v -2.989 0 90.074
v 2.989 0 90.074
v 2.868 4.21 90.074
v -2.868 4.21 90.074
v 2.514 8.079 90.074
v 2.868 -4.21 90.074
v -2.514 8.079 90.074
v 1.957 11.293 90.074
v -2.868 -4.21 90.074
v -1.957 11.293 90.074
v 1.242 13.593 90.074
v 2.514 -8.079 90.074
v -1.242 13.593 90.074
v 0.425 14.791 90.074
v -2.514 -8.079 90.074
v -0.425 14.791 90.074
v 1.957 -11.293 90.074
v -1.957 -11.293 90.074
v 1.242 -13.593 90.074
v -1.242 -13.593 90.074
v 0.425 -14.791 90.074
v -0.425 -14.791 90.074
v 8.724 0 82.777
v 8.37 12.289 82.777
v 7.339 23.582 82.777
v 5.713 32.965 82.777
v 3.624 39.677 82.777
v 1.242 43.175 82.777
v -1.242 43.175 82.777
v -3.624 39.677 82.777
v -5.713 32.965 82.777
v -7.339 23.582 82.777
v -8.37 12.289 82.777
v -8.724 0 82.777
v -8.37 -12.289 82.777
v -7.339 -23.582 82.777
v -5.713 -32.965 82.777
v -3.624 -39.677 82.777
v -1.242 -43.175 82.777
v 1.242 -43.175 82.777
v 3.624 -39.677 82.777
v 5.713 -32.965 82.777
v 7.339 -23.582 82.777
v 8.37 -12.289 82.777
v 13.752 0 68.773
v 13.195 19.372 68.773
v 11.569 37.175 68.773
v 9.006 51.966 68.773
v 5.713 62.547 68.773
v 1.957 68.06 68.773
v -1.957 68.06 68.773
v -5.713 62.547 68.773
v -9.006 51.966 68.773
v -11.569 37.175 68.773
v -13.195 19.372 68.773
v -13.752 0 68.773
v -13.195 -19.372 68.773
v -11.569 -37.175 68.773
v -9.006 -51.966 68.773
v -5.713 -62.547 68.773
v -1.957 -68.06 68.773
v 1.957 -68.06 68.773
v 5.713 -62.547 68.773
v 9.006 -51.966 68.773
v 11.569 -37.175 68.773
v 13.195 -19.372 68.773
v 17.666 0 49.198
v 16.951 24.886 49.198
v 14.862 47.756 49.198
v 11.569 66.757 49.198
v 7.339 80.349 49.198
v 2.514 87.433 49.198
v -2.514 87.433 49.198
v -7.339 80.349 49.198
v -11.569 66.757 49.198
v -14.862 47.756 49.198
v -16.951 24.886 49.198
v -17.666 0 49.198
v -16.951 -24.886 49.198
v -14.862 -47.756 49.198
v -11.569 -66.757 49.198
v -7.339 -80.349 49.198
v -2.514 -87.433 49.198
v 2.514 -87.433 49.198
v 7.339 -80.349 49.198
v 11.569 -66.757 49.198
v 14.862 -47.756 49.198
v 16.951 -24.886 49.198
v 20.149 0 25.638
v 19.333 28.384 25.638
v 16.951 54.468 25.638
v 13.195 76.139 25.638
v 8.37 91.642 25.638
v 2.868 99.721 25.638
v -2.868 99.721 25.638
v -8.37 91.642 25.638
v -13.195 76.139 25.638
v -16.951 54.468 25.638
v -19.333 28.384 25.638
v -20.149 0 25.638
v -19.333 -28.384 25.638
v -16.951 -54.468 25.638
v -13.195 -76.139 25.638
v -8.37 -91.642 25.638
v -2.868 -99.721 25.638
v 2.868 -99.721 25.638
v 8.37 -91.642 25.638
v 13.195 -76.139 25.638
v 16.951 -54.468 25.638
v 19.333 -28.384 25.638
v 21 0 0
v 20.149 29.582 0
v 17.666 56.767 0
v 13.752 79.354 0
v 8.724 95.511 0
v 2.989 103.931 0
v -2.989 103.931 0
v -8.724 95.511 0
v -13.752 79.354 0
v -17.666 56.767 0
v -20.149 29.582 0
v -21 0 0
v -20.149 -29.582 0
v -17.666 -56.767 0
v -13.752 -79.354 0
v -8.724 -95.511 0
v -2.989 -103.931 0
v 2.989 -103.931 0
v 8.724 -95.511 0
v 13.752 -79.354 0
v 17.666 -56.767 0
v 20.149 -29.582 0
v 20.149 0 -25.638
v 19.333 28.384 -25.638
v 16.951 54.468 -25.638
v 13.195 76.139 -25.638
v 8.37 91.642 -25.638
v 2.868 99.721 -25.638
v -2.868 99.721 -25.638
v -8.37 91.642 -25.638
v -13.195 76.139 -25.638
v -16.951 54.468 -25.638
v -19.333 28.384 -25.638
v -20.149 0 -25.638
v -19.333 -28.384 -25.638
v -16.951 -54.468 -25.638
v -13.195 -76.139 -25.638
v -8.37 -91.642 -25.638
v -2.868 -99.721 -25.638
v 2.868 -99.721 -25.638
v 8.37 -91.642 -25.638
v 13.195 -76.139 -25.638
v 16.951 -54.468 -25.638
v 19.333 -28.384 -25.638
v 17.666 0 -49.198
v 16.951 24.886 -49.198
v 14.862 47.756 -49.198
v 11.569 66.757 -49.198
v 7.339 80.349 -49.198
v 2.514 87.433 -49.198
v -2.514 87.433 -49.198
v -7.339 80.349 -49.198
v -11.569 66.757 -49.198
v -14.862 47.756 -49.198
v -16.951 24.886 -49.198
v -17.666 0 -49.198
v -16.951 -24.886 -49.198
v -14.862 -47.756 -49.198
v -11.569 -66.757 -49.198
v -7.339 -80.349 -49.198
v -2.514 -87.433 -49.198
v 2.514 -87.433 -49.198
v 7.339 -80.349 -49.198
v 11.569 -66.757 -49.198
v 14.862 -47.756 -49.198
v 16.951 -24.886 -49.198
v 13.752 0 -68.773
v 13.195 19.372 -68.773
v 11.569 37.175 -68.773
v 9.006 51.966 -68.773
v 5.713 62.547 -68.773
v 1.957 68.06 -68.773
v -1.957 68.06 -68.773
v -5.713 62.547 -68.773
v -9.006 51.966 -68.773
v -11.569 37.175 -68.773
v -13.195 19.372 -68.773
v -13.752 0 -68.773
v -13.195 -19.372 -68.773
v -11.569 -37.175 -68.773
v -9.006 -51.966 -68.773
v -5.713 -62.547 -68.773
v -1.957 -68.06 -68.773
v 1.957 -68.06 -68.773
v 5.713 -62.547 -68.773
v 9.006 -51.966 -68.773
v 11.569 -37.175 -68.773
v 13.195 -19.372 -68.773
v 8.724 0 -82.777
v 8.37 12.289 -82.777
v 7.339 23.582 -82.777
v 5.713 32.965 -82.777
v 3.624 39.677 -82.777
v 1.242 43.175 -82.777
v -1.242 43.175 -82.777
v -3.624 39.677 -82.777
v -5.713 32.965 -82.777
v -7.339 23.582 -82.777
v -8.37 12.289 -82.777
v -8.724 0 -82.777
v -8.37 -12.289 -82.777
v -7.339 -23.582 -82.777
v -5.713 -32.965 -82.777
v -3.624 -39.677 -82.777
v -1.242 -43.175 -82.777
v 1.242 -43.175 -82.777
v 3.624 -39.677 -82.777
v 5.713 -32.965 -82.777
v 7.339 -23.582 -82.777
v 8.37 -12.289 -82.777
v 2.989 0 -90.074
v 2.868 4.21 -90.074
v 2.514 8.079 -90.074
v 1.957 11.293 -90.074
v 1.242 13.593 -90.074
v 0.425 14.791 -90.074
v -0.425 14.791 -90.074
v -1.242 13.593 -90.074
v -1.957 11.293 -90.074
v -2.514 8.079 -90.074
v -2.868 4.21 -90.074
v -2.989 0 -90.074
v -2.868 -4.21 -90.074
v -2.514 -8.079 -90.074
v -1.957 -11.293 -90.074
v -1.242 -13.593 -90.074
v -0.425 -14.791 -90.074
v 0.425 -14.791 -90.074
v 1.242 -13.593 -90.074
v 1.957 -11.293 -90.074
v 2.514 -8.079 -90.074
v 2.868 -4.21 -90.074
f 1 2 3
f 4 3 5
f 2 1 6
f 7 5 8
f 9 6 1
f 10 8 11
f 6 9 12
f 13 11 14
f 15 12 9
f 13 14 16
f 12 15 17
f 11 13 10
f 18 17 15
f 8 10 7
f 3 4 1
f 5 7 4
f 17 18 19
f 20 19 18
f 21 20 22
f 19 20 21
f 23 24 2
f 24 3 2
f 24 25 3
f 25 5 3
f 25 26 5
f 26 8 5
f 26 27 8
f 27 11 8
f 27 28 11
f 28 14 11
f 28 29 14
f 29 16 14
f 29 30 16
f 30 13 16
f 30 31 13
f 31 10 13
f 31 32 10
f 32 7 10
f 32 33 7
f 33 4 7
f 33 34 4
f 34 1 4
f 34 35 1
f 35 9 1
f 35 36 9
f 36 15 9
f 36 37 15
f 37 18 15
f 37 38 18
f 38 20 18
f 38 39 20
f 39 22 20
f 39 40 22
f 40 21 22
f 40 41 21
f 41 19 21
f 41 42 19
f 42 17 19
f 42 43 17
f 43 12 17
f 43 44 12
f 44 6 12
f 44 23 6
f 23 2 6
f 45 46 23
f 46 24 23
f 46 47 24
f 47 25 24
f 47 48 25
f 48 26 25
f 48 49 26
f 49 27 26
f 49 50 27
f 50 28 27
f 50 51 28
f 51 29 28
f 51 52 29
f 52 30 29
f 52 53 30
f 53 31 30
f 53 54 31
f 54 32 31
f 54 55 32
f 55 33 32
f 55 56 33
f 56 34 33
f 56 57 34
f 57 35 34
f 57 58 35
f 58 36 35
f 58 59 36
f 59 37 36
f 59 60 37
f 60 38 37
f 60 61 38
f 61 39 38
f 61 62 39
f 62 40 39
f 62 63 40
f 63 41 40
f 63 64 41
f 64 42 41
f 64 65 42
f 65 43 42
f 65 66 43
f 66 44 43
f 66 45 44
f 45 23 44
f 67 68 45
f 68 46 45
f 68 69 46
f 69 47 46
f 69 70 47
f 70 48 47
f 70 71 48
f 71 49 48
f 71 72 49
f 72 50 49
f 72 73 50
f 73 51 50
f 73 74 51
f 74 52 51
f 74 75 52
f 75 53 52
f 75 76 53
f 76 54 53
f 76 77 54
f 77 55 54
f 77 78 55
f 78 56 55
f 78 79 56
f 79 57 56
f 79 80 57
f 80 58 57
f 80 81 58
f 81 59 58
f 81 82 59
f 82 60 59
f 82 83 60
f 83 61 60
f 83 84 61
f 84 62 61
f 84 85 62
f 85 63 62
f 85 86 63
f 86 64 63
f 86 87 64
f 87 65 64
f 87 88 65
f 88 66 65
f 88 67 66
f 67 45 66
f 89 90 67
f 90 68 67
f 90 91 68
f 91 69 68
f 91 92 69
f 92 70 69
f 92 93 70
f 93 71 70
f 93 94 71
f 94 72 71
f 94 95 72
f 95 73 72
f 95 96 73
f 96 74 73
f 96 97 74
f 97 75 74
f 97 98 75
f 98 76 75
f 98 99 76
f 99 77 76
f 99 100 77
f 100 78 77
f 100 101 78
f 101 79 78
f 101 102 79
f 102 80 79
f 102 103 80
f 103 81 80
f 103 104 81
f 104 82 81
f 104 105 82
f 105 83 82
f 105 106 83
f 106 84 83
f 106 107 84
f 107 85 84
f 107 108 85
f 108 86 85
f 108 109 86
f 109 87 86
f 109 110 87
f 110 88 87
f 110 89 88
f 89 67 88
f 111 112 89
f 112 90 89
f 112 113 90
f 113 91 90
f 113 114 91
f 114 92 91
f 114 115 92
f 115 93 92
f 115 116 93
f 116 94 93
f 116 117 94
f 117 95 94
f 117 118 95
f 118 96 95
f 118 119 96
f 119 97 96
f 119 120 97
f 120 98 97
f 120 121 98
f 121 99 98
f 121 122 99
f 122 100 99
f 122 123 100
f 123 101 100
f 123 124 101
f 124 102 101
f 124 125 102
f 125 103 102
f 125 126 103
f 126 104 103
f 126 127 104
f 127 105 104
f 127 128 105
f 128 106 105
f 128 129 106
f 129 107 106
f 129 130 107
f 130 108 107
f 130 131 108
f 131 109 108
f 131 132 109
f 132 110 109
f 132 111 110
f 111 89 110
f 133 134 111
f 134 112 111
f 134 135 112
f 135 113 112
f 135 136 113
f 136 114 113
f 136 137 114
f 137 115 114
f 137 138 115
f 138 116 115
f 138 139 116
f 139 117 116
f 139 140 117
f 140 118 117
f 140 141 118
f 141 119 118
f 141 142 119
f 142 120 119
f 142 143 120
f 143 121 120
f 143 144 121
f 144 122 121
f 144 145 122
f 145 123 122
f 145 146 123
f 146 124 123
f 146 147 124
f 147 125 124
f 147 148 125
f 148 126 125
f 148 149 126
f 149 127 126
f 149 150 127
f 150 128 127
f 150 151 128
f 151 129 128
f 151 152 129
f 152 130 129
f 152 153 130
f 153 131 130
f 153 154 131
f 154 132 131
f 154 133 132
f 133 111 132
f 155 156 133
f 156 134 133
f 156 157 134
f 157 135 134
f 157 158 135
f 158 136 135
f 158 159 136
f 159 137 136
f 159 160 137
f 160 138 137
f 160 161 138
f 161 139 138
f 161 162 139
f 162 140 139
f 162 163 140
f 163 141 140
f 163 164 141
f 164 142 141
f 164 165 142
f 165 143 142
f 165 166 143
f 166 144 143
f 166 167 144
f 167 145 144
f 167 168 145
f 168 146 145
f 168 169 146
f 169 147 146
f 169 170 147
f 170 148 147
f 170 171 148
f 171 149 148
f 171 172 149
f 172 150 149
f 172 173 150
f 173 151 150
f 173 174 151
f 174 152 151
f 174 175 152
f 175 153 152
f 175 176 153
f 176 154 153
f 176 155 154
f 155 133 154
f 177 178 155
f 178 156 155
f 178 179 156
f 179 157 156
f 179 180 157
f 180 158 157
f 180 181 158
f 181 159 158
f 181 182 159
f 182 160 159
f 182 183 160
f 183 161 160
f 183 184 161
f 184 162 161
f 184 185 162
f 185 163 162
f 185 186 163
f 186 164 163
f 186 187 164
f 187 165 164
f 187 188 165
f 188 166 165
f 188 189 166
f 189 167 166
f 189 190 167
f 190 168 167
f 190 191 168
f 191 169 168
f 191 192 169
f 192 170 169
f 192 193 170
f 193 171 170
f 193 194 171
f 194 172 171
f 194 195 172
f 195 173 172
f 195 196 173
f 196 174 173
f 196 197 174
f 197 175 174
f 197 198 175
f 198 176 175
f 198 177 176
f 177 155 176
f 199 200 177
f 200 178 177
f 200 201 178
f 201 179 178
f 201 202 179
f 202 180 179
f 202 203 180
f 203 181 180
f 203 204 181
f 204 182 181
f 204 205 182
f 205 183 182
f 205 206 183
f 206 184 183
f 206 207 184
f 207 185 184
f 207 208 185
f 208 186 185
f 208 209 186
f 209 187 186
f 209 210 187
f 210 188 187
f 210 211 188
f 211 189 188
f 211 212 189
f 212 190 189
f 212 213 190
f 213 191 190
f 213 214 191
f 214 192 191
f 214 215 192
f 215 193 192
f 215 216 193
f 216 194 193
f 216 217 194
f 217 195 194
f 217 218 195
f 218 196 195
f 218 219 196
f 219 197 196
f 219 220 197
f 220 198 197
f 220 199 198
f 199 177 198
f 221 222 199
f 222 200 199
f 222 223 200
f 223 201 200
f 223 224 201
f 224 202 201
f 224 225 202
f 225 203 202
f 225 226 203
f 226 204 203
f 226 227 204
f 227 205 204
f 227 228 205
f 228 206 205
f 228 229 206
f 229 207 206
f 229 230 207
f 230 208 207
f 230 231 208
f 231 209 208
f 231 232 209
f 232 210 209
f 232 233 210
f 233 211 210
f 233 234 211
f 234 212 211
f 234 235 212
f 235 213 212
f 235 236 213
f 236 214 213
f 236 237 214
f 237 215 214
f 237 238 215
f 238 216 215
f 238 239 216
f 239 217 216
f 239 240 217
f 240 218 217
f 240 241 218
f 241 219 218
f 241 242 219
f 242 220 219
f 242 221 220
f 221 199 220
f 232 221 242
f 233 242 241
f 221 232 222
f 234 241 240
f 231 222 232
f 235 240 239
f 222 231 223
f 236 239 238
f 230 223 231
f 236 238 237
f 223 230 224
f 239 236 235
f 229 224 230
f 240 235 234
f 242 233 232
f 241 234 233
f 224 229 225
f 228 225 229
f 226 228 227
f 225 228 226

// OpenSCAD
// Generated by SolidPython 1.0.1 on 2020-07-29 00:46:45


scale(v = [3, 15, 13]) {
	sphere(r = 7);
}
/***********************************************
*********      SolidPython code:      **********
************************************************
 
# import packages: SolidPython
from solid import *
from solid.utils import *
from itertools import chain, combinations, permutations


class Resize:

    def __init__(self, scad_file):
        self.scad_file = scad_file
        #self.scad_file = import_scad(scad_file)
        # cone/cylinder param:
        self.r1 = 0
        self.r2 = 0
        self.h = 0
        # rectangular prism param:
        self.w = 0
        self.l = 0
        # ellipse param:
        self.r = 0

    # import OpenScad code (file name corresponds to shape)


    # classify shape + parameters
    def assign(self, param1, param2, param3):
        if self.scad_file == 'cone.scad':
            self.r1 = param1
            self.r2 = param2
            self.h = param3
        elif self.scad_file == 'cylinder.scad':
            self.r1 = param1
            self.r2 = param2
            self.h = param3
        elif self.scad_file == 'rectangularPrism.scad':
            self.h = param1
            self.l = param2
            self.w = param3
        else:
            self.r = param1
            self.h = param2

    # resize parameters
    def iterate(self):
        x = range(3, 20, 2)
        i = 1
        if self.scad_file == 'cone.scad':
            tempList = list(permutations(x, 2))
            for temp in tempList:
                param1 = temp[0]
                param2 = temp[1]
                filepath = 'produced_scad_files/' + 'cone' + str(param1) + '_' + str(param2) + '_' + '.scad'
                scad_render_to_file(cylinder(h=param1, r1=param2, r2=0), filepath)

        elif self.scad_file == 'cylinder.scad':
            tempList = list(permutations(x, 3))
            for temp in tempList:
                param1 = temp[0]
                param2 = temp[1]
                filepath = 'produced_scad_files/' + 'cylinder' + str(param1) + '_' + str(param2) + '_' + '.scad'
                scad_render_to_file(cylinder(h=param1, r1=param2, r2=param2), filepath)

        elif self.scad_file == 'rectangularPrism.scad':
            tempList = list(permutations(x, 3))
            for temp in tempList:
                param1 = temp[0]
                param2 = temp[1]
                param3 = temp[2]
                filepath = 'produced_scad_files/' + 'rectangularPrism' + str(param1) + '_' + str(param2) + '_' + str(
                    param3) + '.scad'
                scad_render_to_file(cube(size=(param1, param2, param3)), filepath)

        elif self.scad_file == 'ellipse.scad':
            tempList = list(permutations(x, 4))
            for temp in tempList:
                param1 = temp[0]
                param2 = temp[1]
                param3 = temp[2]
                param4 = temp[3]
                filepath = 'produced_scad_files/' + 'ellipse' + str(param1) + '_' + str(param2) + '_' + str(param3) + '_' + str(param4) + '.scad'
                scad_render_to_file(scale([param1, param2, param3])(sphere(r=param4)), filepath)

    def render_to_scadfile(self):
        scad_render_to_file(scad, 'example.scad') 
 
************************************************/
